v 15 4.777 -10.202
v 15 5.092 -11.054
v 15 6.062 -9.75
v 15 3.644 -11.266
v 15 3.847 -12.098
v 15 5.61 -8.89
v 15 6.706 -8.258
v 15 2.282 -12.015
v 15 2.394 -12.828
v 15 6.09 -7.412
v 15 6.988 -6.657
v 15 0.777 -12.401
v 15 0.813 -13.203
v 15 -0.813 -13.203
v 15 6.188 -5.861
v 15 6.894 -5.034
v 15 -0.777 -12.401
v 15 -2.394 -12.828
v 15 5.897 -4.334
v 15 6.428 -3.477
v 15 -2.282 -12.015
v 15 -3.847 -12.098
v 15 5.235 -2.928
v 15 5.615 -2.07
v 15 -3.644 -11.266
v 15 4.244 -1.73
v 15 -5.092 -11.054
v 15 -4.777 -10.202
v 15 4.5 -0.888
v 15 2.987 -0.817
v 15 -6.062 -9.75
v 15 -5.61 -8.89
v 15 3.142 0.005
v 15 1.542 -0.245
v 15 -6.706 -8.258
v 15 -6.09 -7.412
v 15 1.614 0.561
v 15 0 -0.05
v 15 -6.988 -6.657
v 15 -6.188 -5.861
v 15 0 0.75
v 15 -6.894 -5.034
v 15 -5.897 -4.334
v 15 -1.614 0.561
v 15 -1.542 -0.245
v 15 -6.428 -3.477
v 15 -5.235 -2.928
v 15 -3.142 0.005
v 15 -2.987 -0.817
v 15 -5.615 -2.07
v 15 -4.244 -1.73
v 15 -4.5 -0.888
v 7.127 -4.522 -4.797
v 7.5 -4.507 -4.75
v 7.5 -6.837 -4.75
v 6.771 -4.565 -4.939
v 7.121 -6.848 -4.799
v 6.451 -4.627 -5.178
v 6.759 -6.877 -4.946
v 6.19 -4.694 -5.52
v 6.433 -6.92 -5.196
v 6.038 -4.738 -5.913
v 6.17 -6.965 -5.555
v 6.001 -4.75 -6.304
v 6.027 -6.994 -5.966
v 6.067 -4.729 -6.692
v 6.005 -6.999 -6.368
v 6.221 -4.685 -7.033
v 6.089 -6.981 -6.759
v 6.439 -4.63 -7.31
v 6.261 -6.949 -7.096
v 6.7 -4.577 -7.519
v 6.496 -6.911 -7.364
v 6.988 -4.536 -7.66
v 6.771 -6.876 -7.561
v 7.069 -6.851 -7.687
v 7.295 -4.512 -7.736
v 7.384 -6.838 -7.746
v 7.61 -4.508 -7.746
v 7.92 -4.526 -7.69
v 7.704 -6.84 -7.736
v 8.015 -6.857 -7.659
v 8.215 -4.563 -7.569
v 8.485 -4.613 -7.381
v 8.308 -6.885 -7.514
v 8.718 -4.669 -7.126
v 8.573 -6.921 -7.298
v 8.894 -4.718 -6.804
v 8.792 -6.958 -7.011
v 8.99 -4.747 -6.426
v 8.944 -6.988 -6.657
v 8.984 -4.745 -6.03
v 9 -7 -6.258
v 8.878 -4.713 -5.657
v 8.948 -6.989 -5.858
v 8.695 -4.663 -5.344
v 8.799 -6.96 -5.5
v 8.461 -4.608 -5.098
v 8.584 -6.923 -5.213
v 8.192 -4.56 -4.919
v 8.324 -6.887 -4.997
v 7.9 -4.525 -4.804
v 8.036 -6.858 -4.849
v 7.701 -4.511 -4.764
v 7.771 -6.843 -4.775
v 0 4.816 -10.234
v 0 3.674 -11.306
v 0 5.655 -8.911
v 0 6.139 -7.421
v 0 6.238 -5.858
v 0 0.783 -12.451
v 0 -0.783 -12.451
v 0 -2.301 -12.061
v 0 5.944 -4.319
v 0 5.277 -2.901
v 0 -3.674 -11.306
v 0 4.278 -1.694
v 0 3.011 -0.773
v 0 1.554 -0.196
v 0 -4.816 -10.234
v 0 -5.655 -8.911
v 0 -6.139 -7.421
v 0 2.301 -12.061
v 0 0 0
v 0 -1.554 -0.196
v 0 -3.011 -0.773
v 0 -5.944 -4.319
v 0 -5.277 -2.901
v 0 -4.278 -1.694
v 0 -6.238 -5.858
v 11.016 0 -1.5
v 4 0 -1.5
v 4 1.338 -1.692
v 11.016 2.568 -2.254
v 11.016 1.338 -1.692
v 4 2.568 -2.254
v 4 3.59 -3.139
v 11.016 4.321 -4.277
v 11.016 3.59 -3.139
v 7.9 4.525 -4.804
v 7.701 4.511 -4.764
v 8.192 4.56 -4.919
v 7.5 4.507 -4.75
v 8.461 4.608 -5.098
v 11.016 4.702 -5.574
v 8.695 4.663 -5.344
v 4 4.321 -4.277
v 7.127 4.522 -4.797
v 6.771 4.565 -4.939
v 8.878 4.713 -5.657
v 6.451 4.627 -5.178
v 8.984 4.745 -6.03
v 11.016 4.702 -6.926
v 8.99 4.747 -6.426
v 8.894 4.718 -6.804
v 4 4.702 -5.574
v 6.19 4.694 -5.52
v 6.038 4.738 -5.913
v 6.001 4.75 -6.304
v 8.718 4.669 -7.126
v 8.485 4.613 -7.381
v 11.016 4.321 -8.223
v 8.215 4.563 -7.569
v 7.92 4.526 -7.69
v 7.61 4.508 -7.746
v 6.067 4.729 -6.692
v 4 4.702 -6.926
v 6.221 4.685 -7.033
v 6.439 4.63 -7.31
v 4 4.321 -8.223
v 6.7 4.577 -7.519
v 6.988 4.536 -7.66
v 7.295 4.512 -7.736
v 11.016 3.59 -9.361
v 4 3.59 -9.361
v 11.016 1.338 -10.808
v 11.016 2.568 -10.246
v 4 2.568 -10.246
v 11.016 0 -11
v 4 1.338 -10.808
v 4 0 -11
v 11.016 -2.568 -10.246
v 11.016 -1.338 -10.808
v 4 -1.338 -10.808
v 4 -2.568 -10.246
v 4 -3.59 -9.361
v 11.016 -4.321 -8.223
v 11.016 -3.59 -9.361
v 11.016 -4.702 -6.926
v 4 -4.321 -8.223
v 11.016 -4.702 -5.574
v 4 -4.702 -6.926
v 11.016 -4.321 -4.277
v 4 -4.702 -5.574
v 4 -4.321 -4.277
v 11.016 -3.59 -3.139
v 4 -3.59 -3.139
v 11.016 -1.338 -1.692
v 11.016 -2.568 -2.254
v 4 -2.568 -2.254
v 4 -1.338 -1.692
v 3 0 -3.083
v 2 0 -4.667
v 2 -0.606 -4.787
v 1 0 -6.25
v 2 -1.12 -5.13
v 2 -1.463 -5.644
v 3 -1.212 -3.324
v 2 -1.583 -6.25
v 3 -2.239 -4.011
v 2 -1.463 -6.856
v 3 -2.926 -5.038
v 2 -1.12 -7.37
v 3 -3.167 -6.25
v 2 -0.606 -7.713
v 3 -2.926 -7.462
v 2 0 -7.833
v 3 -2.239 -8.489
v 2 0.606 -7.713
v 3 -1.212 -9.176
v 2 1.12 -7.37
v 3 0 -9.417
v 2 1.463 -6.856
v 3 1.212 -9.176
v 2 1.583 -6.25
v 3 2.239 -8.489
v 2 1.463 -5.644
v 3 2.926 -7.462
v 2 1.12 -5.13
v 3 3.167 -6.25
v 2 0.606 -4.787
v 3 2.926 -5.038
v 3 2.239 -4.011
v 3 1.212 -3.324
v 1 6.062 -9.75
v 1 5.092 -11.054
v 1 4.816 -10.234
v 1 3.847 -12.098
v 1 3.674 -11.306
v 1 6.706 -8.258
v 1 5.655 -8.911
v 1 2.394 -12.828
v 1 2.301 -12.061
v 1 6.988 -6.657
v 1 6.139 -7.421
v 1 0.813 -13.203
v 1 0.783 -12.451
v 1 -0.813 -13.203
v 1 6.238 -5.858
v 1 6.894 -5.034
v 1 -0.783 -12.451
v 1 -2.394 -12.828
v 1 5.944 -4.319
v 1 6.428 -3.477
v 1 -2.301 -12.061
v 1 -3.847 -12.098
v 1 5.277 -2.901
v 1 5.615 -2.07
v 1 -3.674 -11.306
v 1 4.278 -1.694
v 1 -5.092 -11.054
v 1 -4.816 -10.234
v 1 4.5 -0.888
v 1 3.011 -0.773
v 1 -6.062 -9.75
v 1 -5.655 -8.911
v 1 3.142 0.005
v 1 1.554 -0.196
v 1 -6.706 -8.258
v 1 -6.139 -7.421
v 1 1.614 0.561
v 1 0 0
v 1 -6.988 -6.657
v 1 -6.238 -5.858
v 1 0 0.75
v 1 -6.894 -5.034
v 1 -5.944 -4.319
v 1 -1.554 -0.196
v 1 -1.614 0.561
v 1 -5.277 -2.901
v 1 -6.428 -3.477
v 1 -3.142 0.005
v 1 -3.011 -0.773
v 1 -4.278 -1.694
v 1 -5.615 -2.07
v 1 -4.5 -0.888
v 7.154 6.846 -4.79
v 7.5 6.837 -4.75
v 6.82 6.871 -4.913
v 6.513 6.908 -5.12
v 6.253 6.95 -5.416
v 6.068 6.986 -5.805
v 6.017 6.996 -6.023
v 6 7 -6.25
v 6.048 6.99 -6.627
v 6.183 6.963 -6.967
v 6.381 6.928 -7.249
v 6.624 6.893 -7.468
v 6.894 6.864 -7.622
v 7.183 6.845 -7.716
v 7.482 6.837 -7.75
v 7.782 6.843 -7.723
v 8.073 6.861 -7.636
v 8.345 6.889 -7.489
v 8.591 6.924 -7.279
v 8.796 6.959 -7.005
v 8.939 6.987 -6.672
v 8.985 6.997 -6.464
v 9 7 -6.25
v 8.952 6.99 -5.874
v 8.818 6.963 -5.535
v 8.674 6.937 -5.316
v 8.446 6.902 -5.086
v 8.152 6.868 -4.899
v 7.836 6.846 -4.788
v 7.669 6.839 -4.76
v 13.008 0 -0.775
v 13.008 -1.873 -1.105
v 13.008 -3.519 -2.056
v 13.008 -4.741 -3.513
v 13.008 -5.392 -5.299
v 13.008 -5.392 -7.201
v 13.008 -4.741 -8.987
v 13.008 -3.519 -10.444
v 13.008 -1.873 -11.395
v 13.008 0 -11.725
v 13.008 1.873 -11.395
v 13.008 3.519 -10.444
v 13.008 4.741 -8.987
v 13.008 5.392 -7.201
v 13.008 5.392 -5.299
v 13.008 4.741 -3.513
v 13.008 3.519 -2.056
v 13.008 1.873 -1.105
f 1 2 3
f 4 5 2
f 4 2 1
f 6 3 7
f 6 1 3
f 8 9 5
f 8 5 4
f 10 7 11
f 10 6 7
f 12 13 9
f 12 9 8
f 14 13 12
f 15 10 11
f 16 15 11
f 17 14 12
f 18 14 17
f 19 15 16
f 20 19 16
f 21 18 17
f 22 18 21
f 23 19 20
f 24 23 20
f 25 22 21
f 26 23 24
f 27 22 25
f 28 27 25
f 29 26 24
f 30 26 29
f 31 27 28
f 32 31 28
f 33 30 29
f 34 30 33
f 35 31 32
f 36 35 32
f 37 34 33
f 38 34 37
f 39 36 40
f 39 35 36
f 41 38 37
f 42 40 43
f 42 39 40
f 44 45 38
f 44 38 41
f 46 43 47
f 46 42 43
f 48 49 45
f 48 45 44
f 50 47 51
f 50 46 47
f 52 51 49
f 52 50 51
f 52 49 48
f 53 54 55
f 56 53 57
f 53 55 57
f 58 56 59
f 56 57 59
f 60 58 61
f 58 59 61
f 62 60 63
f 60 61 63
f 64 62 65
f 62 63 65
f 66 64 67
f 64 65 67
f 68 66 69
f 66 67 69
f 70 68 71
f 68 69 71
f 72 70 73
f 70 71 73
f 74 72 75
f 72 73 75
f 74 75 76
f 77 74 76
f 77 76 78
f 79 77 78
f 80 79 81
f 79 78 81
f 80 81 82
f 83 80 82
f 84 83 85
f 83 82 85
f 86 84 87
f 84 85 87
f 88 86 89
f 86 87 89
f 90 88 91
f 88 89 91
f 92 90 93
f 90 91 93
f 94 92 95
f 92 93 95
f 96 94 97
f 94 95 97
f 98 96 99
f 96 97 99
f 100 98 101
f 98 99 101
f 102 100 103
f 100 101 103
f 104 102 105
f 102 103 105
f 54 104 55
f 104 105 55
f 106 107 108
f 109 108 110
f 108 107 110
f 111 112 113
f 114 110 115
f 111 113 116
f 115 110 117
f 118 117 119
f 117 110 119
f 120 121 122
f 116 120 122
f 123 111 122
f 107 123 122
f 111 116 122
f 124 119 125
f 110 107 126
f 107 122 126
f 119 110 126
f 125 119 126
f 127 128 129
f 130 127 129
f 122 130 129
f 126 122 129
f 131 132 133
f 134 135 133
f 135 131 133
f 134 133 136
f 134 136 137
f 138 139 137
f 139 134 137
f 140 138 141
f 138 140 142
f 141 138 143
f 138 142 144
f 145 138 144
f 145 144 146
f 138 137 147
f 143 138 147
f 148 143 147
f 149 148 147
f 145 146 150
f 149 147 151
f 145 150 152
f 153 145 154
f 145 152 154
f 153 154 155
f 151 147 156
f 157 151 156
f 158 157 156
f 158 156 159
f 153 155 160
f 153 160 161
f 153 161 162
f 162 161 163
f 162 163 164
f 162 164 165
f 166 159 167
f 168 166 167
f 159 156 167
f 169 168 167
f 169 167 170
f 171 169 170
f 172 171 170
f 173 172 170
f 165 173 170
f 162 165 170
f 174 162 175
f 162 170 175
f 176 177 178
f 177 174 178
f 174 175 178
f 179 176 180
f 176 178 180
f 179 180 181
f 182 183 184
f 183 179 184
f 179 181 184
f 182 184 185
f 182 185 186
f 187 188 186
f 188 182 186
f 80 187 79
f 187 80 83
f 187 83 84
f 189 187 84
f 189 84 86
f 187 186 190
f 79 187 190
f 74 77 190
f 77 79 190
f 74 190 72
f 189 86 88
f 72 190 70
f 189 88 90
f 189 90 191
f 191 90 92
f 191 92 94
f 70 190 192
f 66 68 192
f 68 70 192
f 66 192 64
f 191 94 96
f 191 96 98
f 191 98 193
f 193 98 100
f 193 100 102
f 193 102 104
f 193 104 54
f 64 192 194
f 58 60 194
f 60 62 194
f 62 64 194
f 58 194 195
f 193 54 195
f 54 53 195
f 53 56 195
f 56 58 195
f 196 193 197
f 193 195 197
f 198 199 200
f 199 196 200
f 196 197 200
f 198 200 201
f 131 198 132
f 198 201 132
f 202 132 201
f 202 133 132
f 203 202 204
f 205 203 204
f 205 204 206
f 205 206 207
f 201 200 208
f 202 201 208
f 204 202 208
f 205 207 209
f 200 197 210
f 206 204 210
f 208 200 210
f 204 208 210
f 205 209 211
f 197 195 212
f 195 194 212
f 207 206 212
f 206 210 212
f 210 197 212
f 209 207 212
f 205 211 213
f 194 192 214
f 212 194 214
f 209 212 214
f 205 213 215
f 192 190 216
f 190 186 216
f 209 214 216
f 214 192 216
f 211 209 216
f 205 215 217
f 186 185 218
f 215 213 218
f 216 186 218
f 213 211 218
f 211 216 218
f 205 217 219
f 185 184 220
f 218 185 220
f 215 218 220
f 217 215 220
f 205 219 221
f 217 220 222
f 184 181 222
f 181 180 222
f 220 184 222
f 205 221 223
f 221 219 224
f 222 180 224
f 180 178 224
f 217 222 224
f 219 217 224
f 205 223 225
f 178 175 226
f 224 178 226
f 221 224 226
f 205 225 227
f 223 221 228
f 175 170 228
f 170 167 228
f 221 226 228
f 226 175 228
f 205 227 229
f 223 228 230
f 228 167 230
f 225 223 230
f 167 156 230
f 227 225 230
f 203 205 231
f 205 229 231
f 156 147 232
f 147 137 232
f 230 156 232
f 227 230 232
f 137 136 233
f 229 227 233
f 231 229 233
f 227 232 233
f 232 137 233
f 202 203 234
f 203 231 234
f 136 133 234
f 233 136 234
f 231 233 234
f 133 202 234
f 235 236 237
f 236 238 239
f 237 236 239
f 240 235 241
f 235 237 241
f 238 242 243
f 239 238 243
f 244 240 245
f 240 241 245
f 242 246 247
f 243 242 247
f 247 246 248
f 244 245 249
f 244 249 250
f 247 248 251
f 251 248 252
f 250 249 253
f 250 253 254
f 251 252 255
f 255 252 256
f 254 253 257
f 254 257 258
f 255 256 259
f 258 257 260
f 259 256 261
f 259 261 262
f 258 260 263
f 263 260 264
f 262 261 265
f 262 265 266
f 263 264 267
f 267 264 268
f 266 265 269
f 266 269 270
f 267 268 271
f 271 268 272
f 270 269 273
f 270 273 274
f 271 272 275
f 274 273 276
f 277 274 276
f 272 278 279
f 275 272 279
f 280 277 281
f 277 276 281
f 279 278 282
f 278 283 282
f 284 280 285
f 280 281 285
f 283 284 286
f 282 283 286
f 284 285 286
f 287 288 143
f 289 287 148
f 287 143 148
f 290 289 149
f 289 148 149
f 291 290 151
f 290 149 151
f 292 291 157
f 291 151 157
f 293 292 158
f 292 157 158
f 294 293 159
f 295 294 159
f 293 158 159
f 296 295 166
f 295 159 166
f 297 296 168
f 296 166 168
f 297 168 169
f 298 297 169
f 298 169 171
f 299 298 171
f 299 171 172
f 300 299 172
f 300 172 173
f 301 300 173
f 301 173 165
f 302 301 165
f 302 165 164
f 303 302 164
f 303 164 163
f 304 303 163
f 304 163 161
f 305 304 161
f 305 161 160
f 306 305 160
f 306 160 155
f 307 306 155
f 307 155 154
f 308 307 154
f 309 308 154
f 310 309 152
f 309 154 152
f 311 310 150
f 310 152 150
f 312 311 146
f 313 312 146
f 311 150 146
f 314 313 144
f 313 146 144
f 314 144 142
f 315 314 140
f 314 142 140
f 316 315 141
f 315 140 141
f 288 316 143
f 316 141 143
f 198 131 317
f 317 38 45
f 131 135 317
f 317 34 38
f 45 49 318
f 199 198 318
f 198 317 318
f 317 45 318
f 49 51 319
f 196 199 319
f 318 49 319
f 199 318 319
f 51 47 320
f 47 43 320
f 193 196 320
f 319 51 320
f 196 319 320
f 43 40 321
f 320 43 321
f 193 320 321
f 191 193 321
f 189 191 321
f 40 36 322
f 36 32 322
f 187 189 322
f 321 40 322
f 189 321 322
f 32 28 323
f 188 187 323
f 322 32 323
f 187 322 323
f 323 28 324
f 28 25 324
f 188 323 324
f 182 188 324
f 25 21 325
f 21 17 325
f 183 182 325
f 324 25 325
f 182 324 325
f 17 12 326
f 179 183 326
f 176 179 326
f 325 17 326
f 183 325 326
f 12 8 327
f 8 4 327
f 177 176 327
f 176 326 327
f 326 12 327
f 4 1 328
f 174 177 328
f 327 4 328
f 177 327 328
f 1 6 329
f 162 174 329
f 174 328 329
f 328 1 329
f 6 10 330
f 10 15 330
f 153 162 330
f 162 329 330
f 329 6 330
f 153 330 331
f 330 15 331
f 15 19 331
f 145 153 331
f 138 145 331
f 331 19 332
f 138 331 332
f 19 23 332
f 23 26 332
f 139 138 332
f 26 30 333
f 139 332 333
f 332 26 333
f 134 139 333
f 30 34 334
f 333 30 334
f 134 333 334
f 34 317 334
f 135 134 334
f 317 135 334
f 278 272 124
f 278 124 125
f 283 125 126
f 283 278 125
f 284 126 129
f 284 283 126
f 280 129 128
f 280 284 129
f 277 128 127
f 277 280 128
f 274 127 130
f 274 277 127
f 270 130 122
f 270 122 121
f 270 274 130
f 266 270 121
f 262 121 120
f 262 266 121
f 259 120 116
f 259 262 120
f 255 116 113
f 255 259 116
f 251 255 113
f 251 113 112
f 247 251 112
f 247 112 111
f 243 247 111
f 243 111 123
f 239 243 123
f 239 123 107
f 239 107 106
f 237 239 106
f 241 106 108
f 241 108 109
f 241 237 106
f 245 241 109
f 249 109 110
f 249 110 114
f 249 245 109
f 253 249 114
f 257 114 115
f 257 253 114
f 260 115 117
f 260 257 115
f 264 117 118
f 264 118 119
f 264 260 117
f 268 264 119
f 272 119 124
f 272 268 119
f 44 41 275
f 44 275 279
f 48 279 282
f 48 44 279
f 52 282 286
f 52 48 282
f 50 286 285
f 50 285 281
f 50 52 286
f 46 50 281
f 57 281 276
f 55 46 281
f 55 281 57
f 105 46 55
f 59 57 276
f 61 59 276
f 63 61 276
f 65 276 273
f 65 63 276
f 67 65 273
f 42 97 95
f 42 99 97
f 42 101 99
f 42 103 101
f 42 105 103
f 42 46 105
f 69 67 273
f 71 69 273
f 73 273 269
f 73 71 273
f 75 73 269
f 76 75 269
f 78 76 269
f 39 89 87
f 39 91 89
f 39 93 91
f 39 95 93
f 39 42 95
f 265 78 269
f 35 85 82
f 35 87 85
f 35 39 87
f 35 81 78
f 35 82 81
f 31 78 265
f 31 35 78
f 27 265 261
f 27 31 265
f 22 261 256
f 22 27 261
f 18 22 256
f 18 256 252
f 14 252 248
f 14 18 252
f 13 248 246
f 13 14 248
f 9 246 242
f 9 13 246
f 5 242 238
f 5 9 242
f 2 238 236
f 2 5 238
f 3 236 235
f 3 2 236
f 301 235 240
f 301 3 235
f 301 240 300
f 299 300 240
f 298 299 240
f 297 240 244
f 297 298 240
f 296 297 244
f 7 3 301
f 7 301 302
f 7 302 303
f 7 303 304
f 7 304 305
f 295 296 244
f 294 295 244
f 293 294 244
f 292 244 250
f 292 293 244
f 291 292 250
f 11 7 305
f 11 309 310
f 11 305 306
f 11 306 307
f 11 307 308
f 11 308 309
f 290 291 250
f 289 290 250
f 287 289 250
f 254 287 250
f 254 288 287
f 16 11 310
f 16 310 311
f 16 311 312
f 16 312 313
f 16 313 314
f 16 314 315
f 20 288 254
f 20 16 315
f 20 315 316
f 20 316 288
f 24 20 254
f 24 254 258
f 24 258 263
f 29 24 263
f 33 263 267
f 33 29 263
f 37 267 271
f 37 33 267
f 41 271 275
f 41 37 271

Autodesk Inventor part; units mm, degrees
ref_plane "YZ Plane" through (0, 0, 0) normal (1, 0, 0) x (0, 1, 0)
ref_plane "XY Plane" through (0, 0, 0) normal (0, 0, 1) x (1, 0, 0)
sketch "Sketch1" plane through (0, 0, 0) normal (0, 1, 0) x (-1, 0, 0)
  line L0 (0, 0) -> (0, -6.25)
  line L1 (0, 0) -> (-1, 0)
  line L2 (-1, 0) -> (-1, 0.75)
  line L3 (0, -6.25) -> (-1, -6.25)
  line L4 (-1, 0.75) -> (-15, 0.75)
  line L5 (-15, 0.75) -> (-15, -6.25)
  line L6 (-15, -6.25) -> (-1, -6.25)
  line L7 (-15, -6.25) -> (-15, -1.5)
  line L8 (-15, -6.25) -> (-15, -0.05)
  line L9 (-15, 0.75) -> (-15, -0.05)
  line L10 (-15, -0.05) -> (-11.0162, -1.5)
  line L11 (-11.0162, -1.5) -> (-4, -1.5)
  line L12 (-4, -1.5) -> (-1, -6.25)
  line L13 (-11.0162, -1.5) -> (-4, -1.5)
  dimension "d0" = 6.25
  dimension "d3" = 0.75
  dimension "d5" = 4.75
  dimension "d6" = 6.2
  dimension "d7" = 0.8
  dimension "d11" = 11
revolve "Revolution1" add sketch "Sketch1" angle 360 about axis through (0, 0, -6.25) along (1, 0, 0) contours L0 L3 L12 L11 L10 L5 L4 L2 L1
sketch "Sketch2" plane through (0, 0, 0) normal (0, 0, 1) x (1, 0, 0)
  point P0 (0, 0)
ref_plane "Work Plane1" through (0, 7, 0) normal (0, 1, 0) x (-1, 0, 0)
sketch "Sketch3" plane through (0, 7, 0) normal (0, 1, 0) x (-1, 0, 0)
  line L0 (-15, -12.45) -> (-15, -0.05) projected
  line L1 (-15, -6.25) -> (-7.5, -6.25)
  circle A0 centre (-7.5, -6.25) radius 1.5
  point P0 (0, 0)
  dimension "d14" = 7.5
  dimension "d15" = 3
hole "Hole1" at (7.5, 7, -6.25) direction (0, -1, 0) diameter 3 end through all
properties part number "KOLBEN PART 11" material "Brass, Soft Yellow"
